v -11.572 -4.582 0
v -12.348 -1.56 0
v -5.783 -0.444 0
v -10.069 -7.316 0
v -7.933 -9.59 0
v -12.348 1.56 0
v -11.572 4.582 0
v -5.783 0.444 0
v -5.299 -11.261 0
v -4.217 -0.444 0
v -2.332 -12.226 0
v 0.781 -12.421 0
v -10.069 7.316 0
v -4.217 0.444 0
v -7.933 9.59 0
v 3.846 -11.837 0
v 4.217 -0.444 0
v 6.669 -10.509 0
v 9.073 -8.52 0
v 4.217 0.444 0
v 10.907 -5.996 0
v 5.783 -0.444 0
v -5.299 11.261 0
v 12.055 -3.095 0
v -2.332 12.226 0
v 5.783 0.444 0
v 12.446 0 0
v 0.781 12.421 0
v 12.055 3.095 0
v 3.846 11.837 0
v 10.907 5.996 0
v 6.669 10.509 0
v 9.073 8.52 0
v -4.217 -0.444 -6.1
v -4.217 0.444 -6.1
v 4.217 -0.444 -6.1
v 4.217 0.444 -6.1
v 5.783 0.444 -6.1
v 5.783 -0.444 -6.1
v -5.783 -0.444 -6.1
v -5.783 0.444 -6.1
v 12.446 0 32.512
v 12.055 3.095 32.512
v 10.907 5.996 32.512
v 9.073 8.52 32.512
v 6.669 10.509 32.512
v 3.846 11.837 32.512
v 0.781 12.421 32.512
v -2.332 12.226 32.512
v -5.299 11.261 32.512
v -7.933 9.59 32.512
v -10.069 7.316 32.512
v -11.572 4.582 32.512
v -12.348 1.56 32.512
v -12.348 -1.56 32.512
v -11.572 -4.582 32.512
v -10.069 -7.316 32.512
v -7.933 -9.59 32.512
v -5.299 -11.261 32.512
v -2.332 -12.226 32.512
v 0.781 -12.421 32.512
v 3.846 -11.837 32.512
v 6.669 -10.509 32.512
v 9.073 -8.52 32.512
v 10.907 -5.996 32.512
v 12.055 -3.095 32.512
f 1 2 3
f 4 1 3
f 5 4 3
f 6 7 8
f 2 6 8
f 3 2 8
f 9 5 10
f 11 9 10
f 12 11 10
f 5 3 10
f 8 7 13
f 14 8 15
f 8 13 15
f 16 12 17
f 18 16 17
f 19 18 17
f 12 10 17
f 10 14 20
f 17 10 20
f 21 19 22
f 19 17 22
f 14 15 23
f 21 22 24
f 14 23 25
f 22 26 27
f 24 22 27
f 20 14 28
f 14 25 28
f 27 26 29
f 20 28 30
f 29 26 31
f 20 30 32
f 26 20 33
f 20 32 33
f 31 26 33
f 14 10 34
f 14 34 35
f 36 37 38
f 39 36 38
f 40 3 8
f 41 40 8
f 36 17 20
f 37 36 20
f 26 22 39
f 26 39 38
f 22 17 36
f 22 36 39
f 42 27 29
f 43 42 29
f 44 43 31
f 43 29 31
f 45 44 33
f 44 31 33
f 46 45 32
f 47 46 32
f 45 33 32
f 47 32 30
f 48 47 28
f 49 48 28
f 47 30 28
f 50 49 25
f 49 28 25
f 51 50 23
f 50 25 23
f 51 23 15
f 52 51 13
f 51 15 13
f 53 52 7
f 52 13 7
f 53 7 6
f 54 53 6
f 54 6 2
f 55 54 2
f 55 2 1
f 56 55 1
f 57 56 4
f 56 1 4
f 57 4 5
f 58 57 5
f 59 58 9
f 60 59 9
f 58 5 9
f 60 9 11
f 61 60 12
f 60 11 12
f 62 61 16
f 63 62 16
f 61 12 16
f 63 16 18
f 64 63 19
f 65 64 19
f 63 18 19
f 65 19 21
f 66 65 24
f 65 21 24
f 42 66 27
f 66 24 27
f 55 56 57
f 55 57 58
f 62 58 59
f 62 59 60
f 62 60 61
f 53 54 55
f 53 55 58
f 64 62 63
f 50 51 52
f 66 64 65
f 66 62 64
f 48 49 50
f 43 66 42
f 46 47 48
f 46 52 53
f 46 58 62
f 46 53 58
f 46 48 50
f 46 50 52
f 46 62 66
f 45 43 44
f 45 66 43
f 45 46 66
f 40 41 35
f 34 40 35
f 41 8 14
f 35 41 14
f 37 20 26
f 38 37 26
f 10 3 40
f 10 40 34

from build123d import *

# Parameters (mm, degrees)
SKETCH1_R           = 12.446
BOSS_EXTRUDE1_DEPTH = 32.512
SKETCH2_W           = 1.565145042
SKETCH2_H           = 0.889
BOSS_EXTRUDE2_DEPTH = 6.1


with BuildPart() as part:
    # Sketch1 → Boss-Extrude1 (new body)
    with BuildSketch(Plane.XY):
        Circle(SKETCH1_R)
    extrude(amount=BOSS_EXTRUDE1_DEPTH)

    # Sketch2 → Boss-Extrude2 (add)
    with BuildSketch(Plane.XY):
        with Locations((-5, 0)):
            Rectangle(SKETCH2_W, SKETCH2_H)
        with Locations((5, 0)):
            Rectangle(SKETCH2_W, SKETCH2_H)
    extrude(amount=-BOSS_EXTRUDE2_DEPTH)


solid = part.part
